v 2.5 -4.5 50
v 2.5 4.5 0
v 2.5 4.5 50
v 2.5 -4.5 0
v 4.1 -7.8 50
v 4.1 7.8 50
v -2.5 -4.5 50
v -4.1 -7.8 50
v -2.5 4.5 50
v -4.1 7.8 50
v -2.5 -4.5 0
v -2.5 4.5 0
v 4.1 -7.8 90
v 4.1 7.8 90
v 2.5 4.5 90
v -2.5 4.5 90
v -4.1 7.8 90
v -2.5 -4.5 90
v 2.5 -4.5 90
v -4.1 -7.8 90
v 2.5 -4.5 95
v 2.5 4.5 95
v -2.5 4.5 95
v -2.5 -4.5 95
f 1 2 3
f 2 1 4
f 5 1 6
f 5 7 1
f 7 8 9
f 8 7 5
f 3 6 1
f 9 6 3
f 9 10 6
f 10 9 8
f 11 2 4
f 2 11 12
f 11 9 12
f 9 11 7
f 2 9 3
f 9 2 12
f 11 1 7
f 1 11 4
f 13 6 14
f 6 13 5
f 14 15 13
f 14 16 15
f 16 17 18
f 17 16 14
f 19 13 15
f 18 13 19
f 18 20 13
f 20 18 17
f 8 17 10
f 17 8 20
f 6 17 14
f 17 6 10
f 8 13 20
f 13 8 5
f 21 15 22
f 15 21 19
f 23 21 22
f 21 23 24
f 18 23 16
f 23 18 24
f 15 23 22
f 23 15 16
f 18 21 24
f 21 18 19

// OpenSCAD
// =====================================================================
// xt60_rigid_run.scad — 電源リードの「曲げ不可な硬直区間」簡易キープアウト
//
// 電池側の硬直スリーブ (50mm) + 嵌合した XT60 ペア (電池側プラグ + 変換ケーブル
// 側レセプタクル) + 変換ケーブルのブートを、断面矩形の積み木で近似したモデル。
// 全寸法は推定 — 実測して確定させること (.md 参照)。印刷対象ではない。
//
// 出典: なし (推定値)。
//
// 原点: 底面中心 (0,0,0)。Z = 軸方向、電池側を z=0、変換ケーブル側を z=run_l とする。
//       各区間は X・Y とも Z 軸を中心に置いた cube。
//       z<0 側には可撓リード 60mm が、z>run_l 側には変換ケーブルの可撓線が続く
//       (いずれも本モデルの範囲外)。
// =====================================================================

/* [硬直スリーブ (電池側)] */
sleeve_l = 50;   // 長さ (Z) : z 0..50
sleeve_w = 5;    // 幅 (X)
sleeve_h = 9;    // 高さ (Y)

/* [嵌合した XT60 ペア]  電池側プラグ + 変換ケーブル側レセプタクル */
pair_l = 40;     // 長さ (Z) : z sleeve_l..sleeve_l+pair_l
run_w  = 8.2;    // 幅 (X)
run_h  = 15.6;   // 高さ (Y)

/* [変換ケーブルのブート]  スリーブと同断面 */
boot_l = 5;      // 長さ (Z)

$fn = 32;

// ---- 導出 -----------------------------------------------------------
run_l = sleeve_l + pair_l + boot_l;   // = 95

// ---- 成立性チェック --------------------------------------------------
// スリーブ/ブートの断面は XT60 ペアの断面に収まっていること (段差が逆転しない)
assert(sleeve_w <= run_w && sleeve_h <= run_h,
       str("硬直スリーブ断面 ", sleeve_w, "x", sleeve_h,
           " が XT60 ペア断面 ", run_w, "x", run_h, " を超過"));
assert(run_l > 0, "run_l が正でない");

// ---- 本体 -------------------------------------------------------------
union() {
    // 硬直スリーブ (電池側)
    translate([-sleeve_w / 2, -sleeve_h / 2, 0])
        cube([sleeve_w, sleeve_h, sleeve_l]);

    // 嵌合した XT60 ペア
    translate([-run_w / 2, -run_h / 2, sleeve_l])
        cube([run_w, run_h, pair_l]);

    // 変換ケーブルのブート
    translate([-sleeve_w / 2, -sleeve_h / 2, sleeve_l + pair_l])
        cube([sleeve_w, sleeve_h, boot_l]);
}

echo(str("xt60_rigid_run: 硬直 ", sleeve_l, " + XT60ペア ", pair_l,
         " + ブート ", boot_l, " = ", run_l,
         ", 断面 ", run_w, " x ", run_h));
